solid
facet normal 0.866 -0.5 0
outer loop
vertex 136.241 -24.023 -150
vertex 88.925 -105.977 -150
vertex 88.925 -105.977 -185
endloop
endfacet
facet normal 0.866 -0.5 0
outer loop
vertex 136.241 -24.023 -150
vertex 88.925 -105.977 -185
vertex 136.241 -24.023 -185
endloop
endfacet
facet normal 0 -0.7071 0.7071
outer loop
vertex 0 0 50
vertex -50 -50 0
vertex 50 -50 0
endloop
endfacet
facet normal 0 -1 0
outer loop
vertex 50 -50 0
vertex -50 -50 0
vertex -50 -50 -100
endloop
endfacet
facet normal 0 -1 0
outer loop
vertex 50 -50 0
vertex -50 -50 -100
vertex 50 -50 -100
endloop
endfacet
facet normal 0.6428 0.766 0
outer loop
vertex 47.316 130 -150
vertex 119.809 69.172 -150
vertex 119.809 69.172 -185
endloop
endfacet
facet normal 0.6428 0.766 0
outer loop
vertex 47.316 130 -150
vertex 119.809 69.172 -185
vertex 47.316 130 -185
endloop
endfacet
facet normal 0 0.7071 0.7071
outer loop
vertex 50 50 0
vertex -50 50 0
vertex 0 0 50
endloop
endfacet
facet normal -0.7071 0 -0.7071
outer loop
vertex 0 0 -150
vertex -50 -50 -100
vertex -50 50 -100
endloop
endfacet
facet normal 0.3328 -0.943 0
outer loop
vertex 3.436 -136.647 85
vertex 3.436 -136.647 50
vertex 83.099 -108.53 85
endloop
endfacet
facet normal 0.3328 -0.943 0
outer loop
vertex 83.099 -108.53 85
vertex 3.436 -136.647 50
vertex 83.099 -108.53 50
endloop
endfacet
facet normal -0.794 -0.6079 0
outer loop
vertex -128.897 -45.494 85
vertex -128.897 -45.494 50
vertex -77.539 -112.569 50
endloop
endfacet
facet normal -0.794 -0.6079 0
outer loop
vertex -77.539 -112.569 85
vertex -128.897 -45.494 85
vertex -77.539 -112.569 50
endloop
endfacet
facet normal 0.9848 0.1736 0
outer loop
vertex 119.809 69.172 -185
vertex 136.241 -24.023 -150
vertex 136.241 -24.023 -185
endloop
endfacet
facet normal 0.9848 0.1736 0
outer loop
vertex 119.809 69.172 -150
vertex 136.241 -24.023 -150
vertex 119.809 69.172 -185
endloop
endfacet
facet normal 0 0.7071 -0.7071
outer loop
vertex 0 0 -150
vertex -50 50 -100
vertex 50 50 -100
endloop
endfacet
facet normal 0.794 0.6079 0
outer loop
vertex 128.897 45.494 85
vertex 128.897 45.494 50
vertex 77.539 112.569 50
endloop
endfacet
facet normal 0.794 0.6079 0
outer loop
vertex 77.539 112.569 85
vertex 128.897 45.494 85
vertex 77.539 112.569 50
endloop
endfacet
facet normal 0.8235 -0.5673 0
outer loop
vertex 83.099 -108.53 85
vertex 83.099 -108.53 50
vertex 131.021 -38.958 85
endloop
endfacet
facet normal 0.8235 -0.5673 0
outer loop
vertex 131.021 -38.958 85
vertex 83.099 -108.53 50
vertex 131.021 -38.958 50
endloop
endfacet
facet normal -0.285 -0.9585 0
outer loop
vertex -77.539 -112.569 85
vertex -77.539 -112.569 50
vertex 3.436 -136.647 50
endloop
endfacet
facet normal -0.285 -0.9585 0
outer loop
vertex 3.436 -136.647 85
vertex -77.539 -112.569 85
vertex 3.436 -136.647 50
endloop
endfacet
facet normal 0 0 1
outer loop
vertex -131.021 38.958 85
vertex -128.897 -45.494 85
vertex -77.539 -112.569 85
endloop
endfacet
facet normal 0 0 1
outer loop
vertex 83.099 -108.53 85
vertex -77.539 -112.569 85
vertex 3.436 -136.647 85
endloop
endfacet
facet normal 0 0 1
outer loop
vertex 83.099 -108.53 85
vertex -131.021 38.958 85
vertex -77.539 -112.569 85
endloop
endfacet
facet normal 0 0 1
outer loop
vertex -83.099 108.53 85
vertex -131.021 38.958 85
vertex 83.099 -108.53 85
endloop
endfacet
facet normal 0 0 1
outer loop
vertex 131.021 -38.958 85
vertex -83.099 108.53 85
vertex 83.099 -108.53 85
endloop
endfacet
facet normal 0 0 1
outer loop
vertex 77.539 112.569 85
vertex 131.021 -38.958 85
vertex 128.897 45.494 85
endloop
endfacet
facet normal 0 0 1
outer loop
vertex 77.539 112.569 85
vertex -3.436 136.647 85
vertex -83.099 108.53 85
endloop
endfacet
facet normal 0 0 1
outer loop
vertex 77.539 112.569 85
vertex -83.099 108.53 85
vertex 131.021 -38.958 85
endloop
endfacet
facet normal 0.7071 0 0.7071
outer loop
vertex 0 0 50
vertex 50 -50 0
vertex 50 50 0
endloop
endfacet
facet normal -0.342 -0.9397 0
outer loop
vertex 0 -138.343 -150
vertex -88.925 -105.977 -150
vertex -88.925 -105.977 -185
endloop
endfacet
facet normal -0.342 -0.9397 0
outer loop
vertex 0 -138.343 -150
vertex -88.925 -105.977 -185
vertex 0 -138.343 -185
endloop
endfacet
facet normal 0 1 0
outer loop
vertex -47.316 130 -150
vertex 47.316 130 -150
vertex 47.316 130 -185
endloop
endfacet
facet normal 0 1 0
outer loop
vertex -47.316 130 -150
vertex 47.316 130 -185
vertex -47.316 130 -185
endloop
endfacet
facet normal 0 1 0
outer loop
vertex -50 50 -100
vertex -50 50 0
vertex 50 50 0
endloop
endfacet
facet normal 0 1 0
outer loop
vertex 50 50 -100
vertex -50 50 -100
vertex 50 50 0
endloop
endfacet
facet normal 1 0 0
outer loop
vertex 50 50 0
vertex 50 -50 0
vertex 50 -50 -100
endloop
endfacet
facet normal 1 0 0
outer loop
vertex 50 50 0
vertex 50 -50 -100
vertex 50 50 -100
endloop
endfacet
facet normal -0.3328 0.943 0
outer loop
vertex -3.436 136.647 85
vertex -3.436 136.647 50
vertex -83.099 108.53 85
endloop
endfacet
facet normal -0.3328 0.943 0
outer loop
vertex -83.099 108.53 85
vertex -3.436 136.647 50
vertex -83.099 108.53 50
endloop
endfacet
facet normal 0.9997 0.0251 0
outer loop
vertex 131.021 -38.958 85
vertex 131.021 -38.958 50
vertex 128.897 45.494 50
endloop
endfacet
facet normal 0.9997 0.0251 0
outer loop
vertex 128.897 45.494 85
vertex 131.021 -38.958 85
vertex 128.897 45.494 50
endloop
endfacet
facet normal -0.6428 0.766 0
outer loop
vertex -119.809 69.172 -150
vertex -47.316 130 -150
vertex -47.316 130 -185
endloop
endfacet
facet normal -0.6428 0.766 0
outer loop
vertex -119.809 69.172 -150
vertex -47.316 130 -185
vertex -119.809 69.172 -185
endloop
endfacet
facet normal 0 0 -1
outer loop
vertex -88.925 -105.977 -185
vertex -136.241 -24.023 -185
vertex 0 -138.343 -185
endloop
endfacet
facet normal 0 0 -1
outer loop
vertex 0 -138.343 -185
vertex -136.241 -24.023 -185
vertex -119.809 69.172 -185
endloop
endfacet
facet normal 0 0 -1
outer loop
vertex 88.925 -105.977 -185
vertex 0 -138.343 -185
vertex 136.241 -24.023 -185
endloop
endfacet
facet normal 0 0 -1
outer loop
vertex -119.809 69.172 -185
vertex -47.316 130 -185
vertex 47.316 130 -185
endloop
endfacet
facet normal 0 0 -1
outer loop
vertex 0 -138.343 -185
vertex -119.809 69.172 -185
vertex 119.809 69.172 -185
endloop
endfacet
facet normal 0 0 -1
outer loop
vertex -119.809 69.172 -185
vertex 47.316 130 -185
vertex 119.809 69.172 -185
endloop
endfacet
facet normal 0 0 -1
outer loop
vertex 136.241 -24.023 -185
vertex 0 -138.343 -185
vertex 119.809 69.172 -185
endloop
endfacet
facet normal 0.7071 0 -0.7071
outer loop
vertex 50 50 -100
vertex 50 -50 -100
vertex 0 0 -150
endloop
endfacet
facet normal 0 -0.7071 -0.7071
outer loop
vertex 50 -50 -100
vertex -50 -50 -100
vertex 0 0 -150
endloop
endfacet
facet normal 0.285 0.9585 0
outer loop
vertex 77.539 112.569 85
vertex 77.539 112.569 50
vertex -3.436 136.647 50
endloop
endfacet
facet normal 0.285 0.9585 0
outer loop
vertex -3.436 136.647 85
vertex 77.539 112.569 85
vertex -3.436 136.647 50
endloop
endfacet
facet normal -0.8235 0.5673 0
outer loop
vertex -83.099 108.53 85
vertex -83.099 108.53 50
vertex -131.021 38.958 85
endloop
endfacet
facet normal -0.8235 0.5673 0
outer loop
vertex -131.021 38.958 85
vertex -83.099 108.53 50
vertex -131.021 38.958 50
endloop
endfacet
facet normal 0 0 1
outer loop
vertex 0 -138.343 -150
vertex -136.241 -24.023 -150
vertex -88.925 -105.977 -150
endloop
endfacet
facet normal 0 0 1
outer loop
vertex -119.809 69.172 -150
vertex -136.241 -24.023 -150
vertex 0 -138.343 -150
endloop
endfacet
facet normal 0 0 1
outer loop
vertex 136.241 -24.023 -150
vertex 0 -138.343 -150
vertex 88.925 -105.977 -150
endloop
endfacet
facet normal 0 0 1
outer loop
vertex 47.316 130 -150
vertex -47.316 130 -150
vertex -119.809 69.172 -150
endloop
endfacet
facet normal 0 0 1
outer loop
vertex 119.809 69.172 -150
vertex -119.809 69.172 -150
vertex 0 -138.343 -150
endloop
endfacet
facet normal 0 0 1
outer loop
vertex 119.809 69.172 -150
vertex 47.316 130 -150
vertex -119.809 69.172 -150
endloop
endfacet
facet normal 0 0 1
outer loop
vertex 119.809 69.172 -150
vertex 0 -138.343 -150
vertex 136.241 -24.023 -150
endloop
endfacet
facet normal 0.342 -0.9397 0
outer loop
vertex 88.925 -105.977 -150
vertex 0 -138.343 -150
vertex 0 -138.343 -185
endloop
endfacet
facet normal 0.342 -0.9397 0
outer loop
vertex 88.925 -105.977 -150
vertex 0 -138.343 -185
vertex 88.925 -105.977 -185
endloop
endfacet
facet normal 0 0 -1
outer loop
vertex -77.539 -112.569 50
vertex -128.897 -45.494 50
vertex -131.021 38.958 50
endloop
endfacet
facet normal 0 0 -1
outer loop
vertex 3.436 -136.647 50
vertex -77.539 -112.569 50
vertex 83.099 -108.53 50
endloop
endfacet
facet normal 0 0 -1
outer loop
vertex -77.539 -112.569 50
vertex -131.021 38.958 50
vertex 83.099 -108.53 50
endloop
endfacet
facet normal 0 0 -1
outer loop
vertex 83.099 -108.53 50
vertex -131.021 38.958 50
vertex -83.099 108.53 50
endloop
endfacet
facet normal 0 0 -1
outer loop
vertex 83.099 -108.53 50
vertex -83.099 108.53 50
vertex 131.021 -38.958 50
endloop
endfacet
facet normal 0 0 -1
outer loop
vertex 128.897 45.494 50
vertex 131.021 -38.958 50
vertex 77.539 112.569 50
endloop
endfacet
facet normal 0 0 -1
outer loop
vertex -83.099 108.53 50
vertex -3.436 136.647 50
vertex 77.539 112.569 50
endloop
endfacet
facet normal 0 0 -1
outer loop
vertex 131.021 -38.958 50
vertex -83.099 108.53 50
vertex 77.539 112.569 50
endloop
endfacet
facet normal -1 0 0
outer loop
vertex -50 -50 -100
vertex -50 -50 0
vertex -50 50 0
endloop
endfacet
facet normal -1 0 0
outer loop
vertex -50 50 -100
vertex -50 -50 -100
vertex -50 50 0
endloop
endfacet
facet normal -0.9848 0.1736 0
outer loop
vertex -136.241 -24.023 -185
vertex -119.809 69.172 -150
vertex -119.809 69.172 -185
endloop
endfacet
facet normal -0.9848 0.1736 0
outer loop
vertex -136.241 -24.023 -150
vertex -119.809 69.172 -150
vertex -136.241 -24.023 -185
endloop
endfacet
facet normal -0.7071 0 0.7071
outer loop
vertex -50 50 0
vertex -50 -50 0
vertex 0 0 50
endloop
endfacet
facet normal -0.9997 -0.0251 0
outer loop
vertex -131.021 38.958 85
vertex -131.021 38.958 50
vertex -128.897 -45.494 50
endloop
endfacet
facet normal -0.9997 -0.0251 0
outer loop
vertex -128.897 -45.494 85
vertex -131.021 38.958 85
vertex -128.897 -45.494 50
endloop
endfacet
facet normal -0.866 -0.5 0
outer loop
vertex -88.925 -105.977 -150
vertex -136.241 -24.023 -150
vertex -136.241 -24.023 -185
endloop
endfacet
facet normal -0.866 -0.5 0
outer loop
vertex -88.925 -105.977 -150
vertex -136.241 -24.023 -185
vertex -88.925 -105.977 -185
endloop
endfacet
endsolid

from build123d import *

# Parameters (mm, degrees)
F0_W      = 100
F0_H      = 100
F1_DEPTH  = 100
F2_DEPTH  = 50
F3_SIZE   = 49.99999
F6_DEPTH  = 35
F7_DEPTH  = 50
F8_SIZE   = 49.99999
F11_DEPTH = 35


# Not quite as in the source:
# - a fillet or chamfer is up to 0.001 mm smaller than in the source, because OpenCascade refuses the exact size


with BuildPart() as f1:
    # F0 (on Top) → F1 (new body)
    with BuildSketch(Plane.XY):
        Rectangle(F0_W, F0_H)
    extrude(amount=-F1_DEPTH)

    # F2 (add): a face of the model
    f2_faces = [f1.faces().sort_by_distance(p)[0] for p in [
        (0, 0, 0),
    ]]
    extrude(f2_faces, amount=F2_DEPTH)

    # F3 (size 50 in the source; OpenCascade refuses exactly that, so slightly less here)
    f3_edges = [f1.edges().sort_by_distance(p)[0] for p in [
        (0, -50, 50),
        (0, 50, 50),
        (50, 0, 50),
        (-50, 0, 50),
    ]]
    chamfer(f3_edges, length=F3_SIZE)

    # F7 (add): a face of the model
    f7_faces = [f1.faces().sort_by_distance(p)[0] for p in [
        (0, 0, -100),
    ]]
    extrude(f7_faces, amount=F7_DEPTH)

    # F8 (size 50 in the source; OpenCascade refuses exactly that, so slightly less here)
    f8_edges = [f1.edges().sort_by_distance(p)[0] for p in [
        (0, -50, -150),
        (50, 0, -150),
        (-50, 0, -150),
        (0, 50, -150),
    ]]
    chamfer(f8_edges, length=F8_SIZE)


with BuildPart() as f6:
    # F5 (on offset) → F6 (new body)
    with BuildSketch(Plane.XY.offset(50)):
        Polygon((83.0988892729, -108.5299731581), (131.0207312895, -38.9582910875), (128.8971071844, 45.494134035), (77.5391691864, 112.5693462448), (-3.4360959814, 136.6468942805), (-83.0988892729, 108.5299731581), (-131.0207312895, 38.9582910875), (-128.8971071844, -45.494134035), (-77.5391691864, -112.5693462448), (3.4360959814, -136.6468942805), align=None)
    extrude(amount=F6_DEPTH)


with BuildPart() as f11:
    # F10 (on offset) → F11 (new body)
    with BuildSketch(Plane.XY.offset(-150)):
        Polygon((47.3161304546, 130), (-47.3161304546, 130), (-119.8086480639, 69.1715552109), (-136.2413677193, -24.0230290175), (-88.9252372647, -105.9769709825), (0, -138.3431104219), (88.9252372647, -105.9769709825), (136.2413677193, -24.0230290175), (119.8086480639, 69.1715552109), align=None)
    extrude(amount=-F11_DEPTH)


solid = Compound([f1.part, f6.part, f11.part])
